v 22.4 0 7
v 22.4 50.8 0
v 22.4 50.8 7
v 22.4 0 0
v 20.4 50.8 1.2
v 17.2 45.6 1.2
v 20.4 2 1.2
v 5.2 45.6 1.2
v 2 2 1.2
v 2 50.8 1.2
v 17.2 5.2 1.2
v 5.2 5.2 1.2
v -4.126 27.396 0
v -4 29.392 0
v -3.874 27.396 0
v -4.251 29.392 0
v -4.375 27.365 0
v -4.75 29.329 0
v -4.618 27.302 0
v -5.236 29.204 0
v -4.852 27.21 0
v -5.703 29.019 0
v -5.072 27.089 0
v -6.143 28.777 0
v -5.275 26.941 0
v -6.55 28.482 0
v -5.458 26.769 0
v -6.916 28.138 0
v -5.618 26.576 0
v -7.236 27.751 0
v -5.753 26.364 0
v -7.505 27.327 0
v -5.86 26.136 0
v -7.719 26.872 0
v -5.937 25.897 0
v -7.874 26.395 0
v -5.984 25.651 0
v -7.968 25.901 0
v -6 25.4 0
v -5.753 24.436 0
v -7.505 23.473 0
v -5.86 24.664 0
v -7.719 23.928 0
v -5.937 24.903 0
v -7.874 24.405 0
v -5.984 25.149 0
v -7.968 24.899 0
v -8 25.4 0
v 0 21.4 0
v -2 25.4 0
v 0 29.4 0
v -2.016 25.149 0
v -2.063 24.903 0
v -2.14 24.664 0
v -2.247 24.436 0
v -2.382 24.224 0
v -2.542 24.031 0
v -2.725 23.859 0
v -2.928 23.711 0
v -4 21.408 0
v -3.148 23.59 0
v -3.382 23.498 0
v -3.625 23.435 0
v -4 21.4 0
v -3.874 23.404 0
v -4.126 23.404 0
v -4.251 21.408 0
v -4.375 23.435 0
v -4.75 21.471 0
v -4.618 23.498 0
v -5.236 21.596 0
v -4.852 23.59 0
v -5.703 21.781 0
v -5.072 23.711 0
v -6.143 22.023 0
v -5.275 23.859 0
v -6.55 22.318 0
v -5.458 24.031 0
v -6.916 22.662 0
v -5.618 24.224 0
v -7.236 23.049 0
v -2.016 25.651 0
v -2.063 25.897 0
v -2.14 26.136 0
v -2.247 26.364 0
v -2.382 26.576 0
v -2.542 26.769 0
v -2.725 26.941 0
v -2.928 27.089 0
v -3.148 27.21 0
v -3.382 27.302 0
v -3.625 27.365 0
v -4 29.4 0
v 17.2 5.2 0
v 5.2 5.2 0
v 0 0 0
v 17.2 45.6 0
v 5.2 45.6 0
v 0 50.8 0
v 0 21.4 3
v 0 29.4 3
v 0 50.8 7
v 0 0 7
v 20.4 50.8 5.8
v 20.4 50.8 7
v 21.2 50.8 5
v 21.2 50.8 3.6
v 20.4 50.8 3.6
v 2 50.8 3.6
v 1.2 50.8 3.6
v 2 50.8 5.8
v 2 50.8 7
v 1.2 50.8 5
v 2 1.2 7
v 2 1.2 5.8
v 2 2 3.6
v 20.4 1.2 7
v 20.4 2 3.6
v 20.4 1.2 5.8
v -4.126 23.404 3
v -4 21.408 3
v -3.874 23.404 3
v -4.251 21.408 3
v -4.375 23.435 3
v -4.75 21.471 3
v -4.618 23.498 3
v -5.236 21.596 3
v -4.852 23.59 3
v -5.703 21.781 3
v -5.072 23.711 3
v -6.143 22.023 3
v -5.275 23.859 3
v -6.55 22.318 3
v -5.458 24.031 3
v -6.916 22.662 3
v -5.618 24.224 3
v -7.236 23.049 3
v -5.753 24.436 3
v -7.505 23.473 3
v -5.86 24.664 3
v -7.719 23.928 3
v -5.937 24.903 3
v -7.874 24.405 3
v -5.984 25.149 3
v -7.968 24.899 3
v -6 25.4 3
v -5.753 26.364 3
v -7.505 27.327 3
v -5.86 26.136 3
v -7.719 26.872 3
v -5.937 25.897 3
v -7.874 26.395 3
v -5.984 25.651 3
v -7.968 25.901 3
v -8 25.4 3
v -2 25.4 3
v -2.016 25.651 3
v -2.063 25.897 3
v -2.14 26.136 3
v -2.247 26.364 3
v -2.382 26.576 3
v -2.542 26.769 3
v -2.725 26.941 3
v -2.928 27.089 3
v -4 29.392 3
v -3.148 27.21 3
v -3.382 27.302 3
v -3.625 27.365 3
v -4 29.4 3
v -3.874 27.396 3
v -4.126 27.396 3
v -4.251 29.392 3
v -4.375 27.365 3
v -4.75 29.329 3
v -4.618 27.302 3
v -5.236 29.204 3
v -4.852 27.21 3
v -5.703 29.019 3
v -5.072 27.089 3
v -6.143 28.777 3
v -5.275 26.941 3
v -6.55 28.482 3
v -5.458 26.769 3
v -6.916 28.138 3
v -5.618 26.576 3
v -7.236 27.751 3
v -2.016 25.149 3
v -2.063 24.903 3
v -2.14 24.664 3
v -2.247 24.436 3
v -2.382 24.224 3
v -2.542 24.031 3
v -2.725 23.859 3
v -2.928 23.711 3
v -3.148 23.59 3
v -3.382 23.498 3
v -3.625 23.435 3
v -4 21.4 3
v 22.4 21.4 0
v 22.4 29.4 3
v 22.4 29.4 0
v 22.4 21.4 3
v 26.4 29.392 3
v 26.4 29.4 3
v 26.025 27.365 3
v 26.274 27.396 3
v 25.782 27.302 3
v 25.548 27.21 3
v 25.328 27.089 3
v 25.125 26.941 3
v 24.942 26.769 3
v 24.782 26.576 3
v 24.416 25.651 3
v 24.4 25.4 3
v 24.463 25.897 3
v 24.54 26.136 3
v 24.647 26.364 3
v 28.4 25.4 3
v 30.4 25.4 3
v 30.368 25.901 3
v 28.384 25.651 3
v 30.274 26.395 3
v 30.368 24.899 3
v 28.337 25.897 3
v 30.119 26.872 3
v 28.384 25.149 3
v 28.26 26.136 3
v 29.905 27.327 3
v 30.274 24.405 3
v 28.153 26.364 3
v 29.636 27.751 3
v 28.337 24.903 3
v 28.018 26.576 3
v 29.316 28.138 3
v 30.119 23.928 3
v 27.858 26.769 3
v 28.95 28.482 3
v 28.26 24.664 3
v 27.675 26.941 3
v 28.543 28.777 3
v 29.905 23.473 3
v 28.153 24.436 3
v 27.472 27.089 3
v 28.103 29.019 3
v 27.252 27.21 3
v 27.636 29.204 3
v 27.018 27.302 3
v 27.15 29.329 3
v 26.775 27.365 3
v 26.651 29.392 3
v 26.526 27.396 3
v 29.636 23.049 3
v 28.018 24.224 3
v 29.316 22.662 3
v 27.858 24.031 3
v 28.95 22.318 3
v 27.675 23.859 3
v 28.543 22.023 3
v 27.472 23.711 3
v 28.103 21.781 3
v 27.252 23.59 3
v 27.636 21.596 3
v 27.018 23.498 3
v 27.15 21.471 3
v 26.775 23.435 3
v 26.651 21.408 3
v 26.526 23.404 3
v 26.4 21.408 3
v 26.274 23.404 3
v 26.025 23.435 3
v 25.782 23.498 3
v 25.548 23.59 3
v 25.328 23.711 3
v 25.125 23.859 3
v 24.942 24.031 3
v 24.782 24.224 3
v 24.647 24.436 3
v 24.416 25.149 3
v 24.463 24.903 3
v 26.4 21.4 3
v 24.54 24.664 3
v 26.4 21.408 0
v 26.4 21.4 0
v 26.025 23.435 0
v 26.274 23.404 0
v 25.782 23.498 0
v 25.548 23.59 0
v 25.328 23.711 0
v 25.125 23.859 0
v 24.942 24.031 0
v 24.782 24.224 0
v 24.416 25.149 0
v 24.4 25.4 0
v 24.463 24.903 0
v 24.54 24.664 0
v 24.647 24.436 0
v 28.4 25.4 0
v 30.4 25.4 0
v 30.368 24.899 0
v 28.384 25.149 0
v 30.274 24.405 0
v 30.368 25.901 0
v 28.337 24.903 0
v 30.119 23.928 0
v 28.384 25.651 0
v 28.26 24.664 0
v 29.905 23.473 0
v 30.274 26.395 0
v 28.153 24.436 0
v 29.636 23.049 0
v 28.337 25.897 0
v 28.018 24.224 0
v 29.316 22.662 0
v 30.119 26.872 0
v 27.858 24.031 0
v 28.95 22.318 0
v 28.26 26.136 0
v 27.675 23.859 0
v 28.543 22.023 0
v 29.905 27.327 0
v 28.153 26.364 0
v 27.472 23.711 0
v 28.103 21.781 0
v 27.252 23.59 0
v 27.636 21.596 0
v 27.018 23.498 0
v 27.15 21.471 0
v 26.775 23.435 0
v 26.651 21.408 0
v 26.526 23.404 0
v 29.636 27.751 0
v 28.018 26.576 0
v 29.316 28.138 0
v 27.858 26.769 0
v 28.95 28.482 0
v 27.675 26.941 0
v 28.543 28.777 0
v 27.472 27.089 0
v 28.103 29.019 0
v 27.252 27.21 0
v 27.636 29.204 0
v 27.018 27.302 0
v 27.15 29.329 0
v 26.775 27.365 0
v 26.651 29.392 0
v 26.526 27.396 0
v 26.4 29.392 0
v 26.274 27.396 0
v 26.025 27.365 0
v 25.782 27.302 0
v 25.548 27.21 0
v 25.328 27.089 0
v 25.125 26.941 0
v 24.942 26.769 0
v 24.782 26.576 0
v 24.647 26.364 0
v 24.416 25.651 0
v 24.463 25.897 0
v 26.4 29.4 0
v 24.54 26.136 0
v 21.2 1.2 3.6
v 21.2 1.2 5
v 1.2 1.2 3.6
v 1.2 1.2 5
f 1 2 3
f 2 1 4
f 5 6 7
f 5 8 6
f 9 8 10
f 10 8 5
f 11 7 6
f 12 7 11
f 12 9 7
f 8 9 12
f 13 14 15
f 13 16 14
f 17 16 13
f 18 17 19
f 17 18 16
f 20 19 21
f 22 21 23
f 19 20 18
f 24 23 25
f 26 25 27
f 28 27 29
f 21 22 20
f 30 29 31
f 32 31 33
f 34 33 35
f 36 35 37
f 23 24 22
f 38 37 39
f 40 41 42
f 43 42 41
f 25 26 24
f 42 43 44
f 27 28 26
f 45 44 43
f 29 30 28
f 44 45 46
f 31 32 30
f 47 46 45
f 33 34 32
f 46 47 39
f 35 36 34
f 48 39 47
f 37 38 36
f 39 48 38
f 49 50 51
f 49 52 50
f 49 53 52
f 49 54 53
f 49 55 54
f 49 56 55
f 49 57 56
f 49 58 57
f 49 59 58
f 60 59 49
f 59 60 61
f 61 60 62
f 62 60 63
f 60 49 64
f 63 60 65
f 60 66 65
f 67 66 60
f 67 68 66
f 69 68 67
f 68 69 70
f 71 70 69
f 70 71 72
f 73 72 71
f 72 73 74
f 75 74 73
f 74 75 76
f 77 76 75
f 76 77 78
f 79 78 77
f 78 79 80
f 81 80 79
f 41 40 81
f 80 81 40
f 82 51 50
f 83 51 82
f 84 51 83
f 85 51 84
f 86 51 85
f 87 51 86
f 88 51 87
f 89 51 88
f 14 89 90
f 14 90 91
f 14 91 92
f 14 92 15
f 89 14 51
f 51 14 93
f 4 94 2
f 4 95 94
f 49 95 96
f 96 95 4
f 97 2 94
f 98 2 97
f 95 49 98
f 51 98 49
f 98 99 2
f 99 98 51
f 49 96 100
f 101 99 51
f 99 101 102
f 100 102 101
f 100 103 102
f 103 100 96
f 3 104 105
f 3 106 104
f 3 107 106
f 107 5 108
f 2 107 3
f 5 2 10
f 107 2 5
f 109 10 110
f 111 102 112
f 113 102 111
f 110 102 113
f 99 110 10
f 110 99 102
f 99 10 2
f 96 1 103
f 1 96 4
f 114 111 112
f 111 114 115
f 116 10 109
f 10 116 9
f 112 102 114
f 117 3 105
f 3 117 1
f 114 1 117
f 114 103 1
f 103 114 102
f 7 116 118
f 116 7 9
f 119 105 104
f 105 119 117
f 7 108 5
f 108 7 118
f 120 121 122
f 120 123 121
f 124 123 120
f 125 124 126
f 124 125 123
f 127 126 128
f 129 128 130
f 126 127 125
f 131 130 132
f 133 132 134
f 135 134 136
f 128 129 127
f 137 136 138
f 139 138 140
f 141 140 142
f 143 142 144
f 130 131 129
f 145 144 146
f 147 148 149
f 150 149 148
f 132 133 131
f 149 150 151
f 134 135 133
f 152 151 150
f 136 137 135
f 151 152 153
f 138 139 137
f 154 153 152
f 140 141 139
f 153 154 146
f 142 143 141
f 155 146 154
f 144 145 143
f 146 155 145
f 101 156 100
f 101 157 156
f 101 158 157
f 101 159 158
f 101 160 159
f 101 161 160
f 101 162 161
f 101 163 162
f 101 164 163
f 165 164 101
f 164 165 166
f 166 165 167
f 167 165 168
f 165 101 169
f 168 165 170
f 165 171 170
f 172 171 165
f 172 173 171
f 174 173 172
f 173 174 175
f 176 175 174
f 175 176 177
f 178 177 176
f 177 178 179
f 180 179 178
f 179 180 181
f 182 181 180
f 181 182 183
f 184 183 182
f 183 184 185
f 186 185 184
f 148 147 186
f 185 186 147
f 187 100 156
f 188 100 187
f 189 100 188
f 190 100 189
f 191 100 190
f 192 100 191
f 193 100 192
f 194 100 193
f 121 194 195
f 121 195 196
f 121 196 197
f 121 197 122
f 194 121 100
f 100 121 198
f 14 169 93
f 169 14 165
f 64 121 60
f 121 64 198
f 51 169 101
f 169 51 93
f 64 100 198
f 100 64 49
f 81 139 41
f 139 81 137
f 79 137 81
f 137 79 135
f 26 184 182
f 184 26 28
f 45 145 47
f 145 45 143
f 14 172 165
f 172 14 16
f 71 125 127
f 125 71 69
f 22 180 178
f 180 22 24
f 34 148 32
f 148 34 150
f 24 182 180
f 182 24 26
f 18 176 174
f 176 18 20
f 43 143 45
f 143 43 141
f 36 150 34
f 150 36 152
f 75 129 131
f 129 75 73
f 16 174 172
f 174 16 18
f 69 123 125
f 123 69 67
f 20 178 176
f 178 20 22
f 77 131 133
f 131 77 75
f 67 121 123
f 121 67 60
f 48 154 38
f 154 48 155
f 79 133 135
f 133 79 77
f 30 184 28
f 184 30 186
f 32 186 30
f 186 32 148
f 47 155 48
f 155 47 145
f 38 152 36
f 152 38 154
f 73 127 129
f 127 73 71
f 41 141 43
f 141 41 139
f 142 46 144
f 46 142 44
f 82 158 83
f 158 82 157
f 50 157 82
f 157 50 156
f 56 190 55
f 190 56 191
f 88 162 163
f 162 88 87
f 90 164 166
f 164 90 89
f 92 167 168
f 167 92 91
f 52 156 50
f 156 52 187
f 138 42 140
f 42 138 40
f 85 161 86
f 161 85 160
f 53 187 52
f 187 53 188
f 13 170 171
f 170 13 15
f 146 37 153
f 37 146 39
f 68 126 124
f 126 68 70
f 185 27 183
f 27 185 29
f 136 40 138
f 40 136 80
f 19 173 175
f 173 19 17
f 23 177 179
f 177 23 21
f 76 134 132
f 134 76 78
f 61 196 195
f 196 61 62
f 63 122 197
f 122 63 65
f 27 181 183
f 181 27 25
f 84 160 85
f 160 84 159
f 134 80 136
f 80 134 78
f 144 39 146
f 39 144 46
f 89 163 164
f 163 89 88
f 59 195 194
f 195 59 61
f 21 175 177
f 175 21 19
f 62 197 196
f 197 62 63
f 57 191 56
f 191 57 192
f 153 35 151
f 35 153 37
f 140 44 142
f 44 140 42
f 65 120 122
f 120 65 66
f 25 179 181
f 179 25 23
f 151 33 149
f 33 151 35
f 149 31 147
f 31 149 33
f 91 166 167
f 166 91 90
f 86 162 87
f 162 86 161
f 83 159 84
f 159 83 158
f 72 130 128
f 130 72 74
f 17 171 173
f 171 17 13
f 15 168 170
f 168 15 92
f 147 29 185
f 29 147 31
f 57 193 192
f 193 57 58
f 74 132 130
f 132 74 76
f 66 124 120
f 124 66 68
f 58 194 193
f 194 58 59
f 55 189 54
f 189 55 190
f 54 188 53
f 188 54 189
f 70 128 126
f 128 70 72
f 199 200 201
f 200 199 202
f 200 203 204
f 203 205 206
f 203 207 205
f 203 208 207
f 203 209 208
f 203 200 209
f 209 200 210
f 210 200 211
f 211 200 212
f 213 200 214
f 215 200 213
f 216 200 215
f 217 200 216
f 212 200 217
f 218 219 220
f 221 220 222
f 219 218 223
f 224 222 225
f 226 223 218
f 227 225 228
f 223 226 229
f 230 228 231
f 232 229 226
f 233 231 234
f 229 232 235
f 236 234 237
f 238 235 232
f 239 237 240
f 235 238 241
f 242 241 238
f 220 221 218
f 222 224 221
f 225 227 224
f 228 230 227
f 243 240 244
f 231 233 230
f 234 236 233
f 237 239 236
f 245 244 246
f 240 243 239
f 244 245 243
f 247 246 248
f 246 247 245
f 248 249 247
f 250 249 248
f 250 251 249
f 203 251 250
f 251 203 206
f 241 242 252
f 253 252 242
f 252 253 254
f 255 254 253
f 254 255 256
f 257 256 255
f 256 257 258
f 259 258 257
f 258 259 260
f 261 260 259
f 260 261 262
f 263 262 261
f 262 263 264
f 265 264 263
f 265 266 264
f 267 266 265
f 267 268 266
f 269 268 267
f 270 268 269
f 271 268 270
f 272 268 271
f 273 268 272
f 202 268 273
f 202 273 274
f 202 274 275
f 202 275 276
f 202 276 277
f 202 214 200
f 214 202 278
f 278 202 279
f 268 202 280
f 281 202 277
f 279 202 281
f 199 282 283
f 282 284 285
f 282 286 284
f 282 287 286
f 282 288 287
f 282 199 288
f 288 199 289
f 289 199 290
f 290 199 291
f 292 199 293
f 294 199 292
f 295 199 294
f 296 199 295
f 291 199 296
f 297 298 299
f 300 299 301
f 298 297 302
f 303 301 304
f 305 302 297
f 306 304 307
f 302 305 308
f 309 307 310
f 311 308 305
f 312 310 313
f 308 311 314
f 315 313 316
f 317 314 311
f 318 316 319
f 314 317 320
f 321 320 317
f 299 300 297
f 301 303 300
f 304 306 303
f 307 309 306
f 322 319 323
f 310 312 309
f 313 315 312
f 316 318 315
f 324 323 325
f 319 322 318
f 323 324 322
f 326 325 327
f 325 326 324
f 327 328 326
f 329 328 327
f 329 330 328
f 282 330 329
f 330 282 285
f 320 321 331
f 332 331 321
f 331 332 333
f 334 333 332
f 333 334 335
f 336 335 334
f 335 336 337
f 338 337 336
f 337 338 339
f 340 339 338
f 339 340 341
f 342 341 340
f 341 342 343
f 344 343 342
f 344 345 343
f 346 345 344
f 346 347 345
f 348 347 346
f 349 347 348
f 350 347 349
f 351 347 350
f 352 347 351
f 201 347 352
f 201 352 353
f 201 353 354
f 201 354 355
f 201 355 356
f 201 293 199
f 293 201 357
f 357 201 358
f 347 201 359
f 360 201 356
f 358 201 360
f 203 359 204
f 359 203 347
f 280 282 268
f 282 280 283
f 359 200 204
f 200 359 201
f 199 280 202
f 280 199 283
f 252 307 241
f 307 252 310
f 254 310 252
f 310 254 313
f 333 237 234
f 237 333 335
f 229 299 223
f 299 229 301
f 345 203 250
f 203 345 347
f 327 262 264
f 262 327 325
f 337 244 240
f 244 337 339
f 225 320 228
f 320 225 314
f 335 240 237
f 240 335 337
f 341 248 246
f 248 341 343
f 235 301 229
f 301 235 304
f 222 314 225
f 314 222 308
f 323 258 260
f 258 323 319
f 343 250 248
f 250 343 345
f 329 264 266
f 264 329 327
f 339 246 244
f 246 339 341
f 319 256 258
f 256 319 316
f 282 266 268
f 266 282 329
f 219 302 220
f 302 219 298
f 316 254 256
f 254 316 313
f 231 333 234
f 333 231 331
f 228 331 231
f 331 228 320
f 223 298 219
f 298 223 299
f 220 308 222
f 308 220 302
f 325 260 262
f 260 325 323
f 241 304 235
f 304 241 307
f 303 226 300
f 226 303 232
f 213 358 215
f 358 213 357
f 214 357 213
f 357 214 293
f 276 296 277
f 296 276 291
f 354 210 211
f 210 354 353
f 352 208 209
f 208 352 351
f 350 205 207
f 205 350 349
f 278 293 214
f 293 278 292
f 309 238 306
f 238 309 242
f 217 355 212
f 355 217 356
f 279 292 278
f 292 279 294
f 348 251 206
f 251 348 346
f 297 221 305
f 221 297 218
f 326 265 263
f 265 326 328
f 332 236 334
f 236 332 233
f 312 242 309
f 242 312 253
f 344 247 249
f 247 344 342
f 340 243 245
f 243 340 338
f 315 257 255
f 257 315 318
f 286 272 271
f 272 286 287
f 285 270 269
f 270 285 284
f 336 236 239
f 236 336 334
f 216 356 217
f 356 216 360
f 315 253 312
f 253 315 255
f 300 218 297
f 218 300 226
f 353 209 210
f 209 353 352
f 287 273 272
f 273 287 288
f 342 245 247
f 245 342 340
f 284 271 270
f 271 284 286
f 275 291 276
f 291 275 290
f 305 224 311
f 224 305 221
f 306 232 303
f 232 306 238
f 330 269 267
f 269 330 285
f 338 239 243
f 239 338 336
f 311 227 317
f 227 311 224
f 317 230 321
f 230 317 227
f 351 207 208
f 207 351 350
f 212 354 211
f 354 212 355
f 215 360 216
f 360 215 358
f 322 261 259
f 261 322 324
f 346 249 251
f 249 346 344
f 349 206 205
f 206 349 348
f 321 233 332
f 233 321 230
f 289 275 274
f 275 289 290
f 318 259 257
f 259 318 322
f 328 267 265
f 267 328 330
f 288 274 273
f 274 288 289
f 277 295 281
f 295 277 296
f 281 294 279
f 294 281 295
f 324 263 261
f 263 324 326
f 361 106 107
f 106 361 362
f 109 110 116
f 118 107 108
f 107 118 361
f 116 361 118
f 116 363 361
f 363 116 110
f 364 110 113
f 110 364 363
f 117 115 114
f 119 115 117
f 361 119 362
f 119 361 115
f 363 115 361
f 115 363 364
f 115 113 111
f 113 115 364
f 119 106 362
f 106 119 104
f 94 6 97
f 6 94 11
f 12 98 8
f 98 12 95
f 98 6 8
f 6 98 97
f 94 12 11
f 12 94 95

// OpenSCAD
// file: ../lib/pcb_led_cvf.scad
// for led power module modified

/* bluetooth_mate_holder.scad
 * By John Biehler - November 17, 2011
 * http://www.thingiverse.com/thing:

 * derived from pcb_box_slide_with_tabs.scad
 * By Nicholas C Lewis - Jan 1, 2011
 * http://www.thingiverse.com/thing:5396
 *
 * derived from pcb_box_slide.scad
 *     Parametric, open PCB-box (slide-in) by chlunde
 *     http://www.thingiverse.com/thing:4071
 *
 * CHANGES
 * - adjusted to fit Arduino Mega
 * - added mounting tabs
 * - turned off cutouts
 * - adjusted bottom cutout size
 */

$fn=50;

module pcb_led_cvf(

	pcb_width = 48.2,
	pcb_length =24.1,
	pcb_height =1.1,
	slisse = 0.8,

	pcb_bottom_margin = 1,
	wall_width_thick = 2,
	box_height = 7,

	//tab parameters
	tab_hole_radius=2,
	tab_outer_radius=4,

	inner_margin = 4,

	add_tabs = true

) {
	wall_width = wall_width_thick-slisse;

module tab() {
	difference(){
		union() {
			translate([-tab_outer_radius,-tab_outer_radius,0])
			cube([tab_outer_radius,2*tab_outer_radius,wall_width_thick+1]);
			translate([-tab_outer_radius,0,0])
				cylinder(r=tab_outer_radius, h = wall_width_thick+1);
		}
		translate([-tab_outer_radius,0,0]) {
			cylinder(r= tab_hole_radius, h = wall_width_thick+5,center=true);
		}
	}

}

module box() {
	union() {
		cube([pcb_width + 2*wall_width, pcb_length + 2*wall_width, wall_width]);

		cube([wall_width_thick, pcb_length + 2*wall_width, box_height]);

		cube([pcb_width + 2*wall_width, wall_width_thick, box_height]);

		%translate([0, pcb_length+wall_width, 0])
			cube([pcb_width + 2*wall_width,wall_width,box_height]);

		translate([pcb_width + wall_width - slisse,0,0])
			cube([wall_width_thick, pcb_length + 2*wall_width, box_height]);
	}
	if(add_tabs) {
//comment out this part to remove tabs
		for(i=[(pcb_length + 2*wall_width)/2]){
	translate([0,i,0])tab();
	translate([pcb_width + 2*wall_width,i,0])mirror()tab();
		}
	}

}

module pcb() {
	translate([wall_width, wall_width, wall_width + pcb_bottom_margin])
		cube([pcb_width,pcb_length + wall_width + 0.1,pcb_height]);
	translate([wall_width, wall_width, wall_width + pcb_bottom_margin+pcb_height])rotate([0,45,0])
		cube([pcb_height,pcb_length + wall_width + 0.1,pcb_height]);
	translate([wall_width+pcb_width-2*cos(45)*pcb_height, wall_width, wall_width + pcb_bottom_margin+pcb_height])rotate([0,45,0])
		cube([pcb_height,pcb_length + wall_width + 0.1,pcb_height]);
	translate([wall_width_thick, wall_width, wall_width + pcb_bottom_margin])
		cube([pcb_width-2*slisse,pcb_length + wall_width + 0.1,box_height]);

}



module holes() {
		*translate([wall_width + pcb_width/2, wall_width_thick + 0.1, pcb_width/2+wall_width])
			rotate(a=90,v=[1,0,0])
				cylinder(r=pcb_width/2, h=wall_width_thick + 0.2);

		*translate([-0.1, wall_width + pcb_length/2, pcb_length/2 + wall_width])
			rotate(a=90,v=[0,1,0])
				cylinder(r=pcb_length/2, h=wall_width_thick + 0.2);

		*translate([pcb_width + wall_width - slisse - 0.1, wall_width + pcb_length/2, pcb_length/2 + wall_width])
			rotate(a=90,v=[0,1,0])
				cylinder(r=pcb_length/2, h=wall_width_thick + 0.2);

	 * translate([pcb_width/2 + wall_width, wall_width + pcb_length/2, -0.1])
			rotate(a=0,v=[0,1,0])
				cylinder(r=min(pcb_length,pcb_width)/2 - wall_width/2, h=wall_width_thick + 0.2);

		translate([inner_margin +wall_width, inner_margin+wall_width, -0.1])
			cube([pcb_width-inner_margin*2,pcb_length -inner_margin*2,wall_width + 0.2]);
}

	difference() {
		box();
		pcb();
		holes();
	}
}



pcb_led_cvf();
// main file
use <../lib/pcb_led_cvf.scad>


pcb_led_cvf(
  pcb_length=48.4,
  pcb_width=20,
  pcb_height=1.4,
  pcb_bottom_margin=2.4
);
